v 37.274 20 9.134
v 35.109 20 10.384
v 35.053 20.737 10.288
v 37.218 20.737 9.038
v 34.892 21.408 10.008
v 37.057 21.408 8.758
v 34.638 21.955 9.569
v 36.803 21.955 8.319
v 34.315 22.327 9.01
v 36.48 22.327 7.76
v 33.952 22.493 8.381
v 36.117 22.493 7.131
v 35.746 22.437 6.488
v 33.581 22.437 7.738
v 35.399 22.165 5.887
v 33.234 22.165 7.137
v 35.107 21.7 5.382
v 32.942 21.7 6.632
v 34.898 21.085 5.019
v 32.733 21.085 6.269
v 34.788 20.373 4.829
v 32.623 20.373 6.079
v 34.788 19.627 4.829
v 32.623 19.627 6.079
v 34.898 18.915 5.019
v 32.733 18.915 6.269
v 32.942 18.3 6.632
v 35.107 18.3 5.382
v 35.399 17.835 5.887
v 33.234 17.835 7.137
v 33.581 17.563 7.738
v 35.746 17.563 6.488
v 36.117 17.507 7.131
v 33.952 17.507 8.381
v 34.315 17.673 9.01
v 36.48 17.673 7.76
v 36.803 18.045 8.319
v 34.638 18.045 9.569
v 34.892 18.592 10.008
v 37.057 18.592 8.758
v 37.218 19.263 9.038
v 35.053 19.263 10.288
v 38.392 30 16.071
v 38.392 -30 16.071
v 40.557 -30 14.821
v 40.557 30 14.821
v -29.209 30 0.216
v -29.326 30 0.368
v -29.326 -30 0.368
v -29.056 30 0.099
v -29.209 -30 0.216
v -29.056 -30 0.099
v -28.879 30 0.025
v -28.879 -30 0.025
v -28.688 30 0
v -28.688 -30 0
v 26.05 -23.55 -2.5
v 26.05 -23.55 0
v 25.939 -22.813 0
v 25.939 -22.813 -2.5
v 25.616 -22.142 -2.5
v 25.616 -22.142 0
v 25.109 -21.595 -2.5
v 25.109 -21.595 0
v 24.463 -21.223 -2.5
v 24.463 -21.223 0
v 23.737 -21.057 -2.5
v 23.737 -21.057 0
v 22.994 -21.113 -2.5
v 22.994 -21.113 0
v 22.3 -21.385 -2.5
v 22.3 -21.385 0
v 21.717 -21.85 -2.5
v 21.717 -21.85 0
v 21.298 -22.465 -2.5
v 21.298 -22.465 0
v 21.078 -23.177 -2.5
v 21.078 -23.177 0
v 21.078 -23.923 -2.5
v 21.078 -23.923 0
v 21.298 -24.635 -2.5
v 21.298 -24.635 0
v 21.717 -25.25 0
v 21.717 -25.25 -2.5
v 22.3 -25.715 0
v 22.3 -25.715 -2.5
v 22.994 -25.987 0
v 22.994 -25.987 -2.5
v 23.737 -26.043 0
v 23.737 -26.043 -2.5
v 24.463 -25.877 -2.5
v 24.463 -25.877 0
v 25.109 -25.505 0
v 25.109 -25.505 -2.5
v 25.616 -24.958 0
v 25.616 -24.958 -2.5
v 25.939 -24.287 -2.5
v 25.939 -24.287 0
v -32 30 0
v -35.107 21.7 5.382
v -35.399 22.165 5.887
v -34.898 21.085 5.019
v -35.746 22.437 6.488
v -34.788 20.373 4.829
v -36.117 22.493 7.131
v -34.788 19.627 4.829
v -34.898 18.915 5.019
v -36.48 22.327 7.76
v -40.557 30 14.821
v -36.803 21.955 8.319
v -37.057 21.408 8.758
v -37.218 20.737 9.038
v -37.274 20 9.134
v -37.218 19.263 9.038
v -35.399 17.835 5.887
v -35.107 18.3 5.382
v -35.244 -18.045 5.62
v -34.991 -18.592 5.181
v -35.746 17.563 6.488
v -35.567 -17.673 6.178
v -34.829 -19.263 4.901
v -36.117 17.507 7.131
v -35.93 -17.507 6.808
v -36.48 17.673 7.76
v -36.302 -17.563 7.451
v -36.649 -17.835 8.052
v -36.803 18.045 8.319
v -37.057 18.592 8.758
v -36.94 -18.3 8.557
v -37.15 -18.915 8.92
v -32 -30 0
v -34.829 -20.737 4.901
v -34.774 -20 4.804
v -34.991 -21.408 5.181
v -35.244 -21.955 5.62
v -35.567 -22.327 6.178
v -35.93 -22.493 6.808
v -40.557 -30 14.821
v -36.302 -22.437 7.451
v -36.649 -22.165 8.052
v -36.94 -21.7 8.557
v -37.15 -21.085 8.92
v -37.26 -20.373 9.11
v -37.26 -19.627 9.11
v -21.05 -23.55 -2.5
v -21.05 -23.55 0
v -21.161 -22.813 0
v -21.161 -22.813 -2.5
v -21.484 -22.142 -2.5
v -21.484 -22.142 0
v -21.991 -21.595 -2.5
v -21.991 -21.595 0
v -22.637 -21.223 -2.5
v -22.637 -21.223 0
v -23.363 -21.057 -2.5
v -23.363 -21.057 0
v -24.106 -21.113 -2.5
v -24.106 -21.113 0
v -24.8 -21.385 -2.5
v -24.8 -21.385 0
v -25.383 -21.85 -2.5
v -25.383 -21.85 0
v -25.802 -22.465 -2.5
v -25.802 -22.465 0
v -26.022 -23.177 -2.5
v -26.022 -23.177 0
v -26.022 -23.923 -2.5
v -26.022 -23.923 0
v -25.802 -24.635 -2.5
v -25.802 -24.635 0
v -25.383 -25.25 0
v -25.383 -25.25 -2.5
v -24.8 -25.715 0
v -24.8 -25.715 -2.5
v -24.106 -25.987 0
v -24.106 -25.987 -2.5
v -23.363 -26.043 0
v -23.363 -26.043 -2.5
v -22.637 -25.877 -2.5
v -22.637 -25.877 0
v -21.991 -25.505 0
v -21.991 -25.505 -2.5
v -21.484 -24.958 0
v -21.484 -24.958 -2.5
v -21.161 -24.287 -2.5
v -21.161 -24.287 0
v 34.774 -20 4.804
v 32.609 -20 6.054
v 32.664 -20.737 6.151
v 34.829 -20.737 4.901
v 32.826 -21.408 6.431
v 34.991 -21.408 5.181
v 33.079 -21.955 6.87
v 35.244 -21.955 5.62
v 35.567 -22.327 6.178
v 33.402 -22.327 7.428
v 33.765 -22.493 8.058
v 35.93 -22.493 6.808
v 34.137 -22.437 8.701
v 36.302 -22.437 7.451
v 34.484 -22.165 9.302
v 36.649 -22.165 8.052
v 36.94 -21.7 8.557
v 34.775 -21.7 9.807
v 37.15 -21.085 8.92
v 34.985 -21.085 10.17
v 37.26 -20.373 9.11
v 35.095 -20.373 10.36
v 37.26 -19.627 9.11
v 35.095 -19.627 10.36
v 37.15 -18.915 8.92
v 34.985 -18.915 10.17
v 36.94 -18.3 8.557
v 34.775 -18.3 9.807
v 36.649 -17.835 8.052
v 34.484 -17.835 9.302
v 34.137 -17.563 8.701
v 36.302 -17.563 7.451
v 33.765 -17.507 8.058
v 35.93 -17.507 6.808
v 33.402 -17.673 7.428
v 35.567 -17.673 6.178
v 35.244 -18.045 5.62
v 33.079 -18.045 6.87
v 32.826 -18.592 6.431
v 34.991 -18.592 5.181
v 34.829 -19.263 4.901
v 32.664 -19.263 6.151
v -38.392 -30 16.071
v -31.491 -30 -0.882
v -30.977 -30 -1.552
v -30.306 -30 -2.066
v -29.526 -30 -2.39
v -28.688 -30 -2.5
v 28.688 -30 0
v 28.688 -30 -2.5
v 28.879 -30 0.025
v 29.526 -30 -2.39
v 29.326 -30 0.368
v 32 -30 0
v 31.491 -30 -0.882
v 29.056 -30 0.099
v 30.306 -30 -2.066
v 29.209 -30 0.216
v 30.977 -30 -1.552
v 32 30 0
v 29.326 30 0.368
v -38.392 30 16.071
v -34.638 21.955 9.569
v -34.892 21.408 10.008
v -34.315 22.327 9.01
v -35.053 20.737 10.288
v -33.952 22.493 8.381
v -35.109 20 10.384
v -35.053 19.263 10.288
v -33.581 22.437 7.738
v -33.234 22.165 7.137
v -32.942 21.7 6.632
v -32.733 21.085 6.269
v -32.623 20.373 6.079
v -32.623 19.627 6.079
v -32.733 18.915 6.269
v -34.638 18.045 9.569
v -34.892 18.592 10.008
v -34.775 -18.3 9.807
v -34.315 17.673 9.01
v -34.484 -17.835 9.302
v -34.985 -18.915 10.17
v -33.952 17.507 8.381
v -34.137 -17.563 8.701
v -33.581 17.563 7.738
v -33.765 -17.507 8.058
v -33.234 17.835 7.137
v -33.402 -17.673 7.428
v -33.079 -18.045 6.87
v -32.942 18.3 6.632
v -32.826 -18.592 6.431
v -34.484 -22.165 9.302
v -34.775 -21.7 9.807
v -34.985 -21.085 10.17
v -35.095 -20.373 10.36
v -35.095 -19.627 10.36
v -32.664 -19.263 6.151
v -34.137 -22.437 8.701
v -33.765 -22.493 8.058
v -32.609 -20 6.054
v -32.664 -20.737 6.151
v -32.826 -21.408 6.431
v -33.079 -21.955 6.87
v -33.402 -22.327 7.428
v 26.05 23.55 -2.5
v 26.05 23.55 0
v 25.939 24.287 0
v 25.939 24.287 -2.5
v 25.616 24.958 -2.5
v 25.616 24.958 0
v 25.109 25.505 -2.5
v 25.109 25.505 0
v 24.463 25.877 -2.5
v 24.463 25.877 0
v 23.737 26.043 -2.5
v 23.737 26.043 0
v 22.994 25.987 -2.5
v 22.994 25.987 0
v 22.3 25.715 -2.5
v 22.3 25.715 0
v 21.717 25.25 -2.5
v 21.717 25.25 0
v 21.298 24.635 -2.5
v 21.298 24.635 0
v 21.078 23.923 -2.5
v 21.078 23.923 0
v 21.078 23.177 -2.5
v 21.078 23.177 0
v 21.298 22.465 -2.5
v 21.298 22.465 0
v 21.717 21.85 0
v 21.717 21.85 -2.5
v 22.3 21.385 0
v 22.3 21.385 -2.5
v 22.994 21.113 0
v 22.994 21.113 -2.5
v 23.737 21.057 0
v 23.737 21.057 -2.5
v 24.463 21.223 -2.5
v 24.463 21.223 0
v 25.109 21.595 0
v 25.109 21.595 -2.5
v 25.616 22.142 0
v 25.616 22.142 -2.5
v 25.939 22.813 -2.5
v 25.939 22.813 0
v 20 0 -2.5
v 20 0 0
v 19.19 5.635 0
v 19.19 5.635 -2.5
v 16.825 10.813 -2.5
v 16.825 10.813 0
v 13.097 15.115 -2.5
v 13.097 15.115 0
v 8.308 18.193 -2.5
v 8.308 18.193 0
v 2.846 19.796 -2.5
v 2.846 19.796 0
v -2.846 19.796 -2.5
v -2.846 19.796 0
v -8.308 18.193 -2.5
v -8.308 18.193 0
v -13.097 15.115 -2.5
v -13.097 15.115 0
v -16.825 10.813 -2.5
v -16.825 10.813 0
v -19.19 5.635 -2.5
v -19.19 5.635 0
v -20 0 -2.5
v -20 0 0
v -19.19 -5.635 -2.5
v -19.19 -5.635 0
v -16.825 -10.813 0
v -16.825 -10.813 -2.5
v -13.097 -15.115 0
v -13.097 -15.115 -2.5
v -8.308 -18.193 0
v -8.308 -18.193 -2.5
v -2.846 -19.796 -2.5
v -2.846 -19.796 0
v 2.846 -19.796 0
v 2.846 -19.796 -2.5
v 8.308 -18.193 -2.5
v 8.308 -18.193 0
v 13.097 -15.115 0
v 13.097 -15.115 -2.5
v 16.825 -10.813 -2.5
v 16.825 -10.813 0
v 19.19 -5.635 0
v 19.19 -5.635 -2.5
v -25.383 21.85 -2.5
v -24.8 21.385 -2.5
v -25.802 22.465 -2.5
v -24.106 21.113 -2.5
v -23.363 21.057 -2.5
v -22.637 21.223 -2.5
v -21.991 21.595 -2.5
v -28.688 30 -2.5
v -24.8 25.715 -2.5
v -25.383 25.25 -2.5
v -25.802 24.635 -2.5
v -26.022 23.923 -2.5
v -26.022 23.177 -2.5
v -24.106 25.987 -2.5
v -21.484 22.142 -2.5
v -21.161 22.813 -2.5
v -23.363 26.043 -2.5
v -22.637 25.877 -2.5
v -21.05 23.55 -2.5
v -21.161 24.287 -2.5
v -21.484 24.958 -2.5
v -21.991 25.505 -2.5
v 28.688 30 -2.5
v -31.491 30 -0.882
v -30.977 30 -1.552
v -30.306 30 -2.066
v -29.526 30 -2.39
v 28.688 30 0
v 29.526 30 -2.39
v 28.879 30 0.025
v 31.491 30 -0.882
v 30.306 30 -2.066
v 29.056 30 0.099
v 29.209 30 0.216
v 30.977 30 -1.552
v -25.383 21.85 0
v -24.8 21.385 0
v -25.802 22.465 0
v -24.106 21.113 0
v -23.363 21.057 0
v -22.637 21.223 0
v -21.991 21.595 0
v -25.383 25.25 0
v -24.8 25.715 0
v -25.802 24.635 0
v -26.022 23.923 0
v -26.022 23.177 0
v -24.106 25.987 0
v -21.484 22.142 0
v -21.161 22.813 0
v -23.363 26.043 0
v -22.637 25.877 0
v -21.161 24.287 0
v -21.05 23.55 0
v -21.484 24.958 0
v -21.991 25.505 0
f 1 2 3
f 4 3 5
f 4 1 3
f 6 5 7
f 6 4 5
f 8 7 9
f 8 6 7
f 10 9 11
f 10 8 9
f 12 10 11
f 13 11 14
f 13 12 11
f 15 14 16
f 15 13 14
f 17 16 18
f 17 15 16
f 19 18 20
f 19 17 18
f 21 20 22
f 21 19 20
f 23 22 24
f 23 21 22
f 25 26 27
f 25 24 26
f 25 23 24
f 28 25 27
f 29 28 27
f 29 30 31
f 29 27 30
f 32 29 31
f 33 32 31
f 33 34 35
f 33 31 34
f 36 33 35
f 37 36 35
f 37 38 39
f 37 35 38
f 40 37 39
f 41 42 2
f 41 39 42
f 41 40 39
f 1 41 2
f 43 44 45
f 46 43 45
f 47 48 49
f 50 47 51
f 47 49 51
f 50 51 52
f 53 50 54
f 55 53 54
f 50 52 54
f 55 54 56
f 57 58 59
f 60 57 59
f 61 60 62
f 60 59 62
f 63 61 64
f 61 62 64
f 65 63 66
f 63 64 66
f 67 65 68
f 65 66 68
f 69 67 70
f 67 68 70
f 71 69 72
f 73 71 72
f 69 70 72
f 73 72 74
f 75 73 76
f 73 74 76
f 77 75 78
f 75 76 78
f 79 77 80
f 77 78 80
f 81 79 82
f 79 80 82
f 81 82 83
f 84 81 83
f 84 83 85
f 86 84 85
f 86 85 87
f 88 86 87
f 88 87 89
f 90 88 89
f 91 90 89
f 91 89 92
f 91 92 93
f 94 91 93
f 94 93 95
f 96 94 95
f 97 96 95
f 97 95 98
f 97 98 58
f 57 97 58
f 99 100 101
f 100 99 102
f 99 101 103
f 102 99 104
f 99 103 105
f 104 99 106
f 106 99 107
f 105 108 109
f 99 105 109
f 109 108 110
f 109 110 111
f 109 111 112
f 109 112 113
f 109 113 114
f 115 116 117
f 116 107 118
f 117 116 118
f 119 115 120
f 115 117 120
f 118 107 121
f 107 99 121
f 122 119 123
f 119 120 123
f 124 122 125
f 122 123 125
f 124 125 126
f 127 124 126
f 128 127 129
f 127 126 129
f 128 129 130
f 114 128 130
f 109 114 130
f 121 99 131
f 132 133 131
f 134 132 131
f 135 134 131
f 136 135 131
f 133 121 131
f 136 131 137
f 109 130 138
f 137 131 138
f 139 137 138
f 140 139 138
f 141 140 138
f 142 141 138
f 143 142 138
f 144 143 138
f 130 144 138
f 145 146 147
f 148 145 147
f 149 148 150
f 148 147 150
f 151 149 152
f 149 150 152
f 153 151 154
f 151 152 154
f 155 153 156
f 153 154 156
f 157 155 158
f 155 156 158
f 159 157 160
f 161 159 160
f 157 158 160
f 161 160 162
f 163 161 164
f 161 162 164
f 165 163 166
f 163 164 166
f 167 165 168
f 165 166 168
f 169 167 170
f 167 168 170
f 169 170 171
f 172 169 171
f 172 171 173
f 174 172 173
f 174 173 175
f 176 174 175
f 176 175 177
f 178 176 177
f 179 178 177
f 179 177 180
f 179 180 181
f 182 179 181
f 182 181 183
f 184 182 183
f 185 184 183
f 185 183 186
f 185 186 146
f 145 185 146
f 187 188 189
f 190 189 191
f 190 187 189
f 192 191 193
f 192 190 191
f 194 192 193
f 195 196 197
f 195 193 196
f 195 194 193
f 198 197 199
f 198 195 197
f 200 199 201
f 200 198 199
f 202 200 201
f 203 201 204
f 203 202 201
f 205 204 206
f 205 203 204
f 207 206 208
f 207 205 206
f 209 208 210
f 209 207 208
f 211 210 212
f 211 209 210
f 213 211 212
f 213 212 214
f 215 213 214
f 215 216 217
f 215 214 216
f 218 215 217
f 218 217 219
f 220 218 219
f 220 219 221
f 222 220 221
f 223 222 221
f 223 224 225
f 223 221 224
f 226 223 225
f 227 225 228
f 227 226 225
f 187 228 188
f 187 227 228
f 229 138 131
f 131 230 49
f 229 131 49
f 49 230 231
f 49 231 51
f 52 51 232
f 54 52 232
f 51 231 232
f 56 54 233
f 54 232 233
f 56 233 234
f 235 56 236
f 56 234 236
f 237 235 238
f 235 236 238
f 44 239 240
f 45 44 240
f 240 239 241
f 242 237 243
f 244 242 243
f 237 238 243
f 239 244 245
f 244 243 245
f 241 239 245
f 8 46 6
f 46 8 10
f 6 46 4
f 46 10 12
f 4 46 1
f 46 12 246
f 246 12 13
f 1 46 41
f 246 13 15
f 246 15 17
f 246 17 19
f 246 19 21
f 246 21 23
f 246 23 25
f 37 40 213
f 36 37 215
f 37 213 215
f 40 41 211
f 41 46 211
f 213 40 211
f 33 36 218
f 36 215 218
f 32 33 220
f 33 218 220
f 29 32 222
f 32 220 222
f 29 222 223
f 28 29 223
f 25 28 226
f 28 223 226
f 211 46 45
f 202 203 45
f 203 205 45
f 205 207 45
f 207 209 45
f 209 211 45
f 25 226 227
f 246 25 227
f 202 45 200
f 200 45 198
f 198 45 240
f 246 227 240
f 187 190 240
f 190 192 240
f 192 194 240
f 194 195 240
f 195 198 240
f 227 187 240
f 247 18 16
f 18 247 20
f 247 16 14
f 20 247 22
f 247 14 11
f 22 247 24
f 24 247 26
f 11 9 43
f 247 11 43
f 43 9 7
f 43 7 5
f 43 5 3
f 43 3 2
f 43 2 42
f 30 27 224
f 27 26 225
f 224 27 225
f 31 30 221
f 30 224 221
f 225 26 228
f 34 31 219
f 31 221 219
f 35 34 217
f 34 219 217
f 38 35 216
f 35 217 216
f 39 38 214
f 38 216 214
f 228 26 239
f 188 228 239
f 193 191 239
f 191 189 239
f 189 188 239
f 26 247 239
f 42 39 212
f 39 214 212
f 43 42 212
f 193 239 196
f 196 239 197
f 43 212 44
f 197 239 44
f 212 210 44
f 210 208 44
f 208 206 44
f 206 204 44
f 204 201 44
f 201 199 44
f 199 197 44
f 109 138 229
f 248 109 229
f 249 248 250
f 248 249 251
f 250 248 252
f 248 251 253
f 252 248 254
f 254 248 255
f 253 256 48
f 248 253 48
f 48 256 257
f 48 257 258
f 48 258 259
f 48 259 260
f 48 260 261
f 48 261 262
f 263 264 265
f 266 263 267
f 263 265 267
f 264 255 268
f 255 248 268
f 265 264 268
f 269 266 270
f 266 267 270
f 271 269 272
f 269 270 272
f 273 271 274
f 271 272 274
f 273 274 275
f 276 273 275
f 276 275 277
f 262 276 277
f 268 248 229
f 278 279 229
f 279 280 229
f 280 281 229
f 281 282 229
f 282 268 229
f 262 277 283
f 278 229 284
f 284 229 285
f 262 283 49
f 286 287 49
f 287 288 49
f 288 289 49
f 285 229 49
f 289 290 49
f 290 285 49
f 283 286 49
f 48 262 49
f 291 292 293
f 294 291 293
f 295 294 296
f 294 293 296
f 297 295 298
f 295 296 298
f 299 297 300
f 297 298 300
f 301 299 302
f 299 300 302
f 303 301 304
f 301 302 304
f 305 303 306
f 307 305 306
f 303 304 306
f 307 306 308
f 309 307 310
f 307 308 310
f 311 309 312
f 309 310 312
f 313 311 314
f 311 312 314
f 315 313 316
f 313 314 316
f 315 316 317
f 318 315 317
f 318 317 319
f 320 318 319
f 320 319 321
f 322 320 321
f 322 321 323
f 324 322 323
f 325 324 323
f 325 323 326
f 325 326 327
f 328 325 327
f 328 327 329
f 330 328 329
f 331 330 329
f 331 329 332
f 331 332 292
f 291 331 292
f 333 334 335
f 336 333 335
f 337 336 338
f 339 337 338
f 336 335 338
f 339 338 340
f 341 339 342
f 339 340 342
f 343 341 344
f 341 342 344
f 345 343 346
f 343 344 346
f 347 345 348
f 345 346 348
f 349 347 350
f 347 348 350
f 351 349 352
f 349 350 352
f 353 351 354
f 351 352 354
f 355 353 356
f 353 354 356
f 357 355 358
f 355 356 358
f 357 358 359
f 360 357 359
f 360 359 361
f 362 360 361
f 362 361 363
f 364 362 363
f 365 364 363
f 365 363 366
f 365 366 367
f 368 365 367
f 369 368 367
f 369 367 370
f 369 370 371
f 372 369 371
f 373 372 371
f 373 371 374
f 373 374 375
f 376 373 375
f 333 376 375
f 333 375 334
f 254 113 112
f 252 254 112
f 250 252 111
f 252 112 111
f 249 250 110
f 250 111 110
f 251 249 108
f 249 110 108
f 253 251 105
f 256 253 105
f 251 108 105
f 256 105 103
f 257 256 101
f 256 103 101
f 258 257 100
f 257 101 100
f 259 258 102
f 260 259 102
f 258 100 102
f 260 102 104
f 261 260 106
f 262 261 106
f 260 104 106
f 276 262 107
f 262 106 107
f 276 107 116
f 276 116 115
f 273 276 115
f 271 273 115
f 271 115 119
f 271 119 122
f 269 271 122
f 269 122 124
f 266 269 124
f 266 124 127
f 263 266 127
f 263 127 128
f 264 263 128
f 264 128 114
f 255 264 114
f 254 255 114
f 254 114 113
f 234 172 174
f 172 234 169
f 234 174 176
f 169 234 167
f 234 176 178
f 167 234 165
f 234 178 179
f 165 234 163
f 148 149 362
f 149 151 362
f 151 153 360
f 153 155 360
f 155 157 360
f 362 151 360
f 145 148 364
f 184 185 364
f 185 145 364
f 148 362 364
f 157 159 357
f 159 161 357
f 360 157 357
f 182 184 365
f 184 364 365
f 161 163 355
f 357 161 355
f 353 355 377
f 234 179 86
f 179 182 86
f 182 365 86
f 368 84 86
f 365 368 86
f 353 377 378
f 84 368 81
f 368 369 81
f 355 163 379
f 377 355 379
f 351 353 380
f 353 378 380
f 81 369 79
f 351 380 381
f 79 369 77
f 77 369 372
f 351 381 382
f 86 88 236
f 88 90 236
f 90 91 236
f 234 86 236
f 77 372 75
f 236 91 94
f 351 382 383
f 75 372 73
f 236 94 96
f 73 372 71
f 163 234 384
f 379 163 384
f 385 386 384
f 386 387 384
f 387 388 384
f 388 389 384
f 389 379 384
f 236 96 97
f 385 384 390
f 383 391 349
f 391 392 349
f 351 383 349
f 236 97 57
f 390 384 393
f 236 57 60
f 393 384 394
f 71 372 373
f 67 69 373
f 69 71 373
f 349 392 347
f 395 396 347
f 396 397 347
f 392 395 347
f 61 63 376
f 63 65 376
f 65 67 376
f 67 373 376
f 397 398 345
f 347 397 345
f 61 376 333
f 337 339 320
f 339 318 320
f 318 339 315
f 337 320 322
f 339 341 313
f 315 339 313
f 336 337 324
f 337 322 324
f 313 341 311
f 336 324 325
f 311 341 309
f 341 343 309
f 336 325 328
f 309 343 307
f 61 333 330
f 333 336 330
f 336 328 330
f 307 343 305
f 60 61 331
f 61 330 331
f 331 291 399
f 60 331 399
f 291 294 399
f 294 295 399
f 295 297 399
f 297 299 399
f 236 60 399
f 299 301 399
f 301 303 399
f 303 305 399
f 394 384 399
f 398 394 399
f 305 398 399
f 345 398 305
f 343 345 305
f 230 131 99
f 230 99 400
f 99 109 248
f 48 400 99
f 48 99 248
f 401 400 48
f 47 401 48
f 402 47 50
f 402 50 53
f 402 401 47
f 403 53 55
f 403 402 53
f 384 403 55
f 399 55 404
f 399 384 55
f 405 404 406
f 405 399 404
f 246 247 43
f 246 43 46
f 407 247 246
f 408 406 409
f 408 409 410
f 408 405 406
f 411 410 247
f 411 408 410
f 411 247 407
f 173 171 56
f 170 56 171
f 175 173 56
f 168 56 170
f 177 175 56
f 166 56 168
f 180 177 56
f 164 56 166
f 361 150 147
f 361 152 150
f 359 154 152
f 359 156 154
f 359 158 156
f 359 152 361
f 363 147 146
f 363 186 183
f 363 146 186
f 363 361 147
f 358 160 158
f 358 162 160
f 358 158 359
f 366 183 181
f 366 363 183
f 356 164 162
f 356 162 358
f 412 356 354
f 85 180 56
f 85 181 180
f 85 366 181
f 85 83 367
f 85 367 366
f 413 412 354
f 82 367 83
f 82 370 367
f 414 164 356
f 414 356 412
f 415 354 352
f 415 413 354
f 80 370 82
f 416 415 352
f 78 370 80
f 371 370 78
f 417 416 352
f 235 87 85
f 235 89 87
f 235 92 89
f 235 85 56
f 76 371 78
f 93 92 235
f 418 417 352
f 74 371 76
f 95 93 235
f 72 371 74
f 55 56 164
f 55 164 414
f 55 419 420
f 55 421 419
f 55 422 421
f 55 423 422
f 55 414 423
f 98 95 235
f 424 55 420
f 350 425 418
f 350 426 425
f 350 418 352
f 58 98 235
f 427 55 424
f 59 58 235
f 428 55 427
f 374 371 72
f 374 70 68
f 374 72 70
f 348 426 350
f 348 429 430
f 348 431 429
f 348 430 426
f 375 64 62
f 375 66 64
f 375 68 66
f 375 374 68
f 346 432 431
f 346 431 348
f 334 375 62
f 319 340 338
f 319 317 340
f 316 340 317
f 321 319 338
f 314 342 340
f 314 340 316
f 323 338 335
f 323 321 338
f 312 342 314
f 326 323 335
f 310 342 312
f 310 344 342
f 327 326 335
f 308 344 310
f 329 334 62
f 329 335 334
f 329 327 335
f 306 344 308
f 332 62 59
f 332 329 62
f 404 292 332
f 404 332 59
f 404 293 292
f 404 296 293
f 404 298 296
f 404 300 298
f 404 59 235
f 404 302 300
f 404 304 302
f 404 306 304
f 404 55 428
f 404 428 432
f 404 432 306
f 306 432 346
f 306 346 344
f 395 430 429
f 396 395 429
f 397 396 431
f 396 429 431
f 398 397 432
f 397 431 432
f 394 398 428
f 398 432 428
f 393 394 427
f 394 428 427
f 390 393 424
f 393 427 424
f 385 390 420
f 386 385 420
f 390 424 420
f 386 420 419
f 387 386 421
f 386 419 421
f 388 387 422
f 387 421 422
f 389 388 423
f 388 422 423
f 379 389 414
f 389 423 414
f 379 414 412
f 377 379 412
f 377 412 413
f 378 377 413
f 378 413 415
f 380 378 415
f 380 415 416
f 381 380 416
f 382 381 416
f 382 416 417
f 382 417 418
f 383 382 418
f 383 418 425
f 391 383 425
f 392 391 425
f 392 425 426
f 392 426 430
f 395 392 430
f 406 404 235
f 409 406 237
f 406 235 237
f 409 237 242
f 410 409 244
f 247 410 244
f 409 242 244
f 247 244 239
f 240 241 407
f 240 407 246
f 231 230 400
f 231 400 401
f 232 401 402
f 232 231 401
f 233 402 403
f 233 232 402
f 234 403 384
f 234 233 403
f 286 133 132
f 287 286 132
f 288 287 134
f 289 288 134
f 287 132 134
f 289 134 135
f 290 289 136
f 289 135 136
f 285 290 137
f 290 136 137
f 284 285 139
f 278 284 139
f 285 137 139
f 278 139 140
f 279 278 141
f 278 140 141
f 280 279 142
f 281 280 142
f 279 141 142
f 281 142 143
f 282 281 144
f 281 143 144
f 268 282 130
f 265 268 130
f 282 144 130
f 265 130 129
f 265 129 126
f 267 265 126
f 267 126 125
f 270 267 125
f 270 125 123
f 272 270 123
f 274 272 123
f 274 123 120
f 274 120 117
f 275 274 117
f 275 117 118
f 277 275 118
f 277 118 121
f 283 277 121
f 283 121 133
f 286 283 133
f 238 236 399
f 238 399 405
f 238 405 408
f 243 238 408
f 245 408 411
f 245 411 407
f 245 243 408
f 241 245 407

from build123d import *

# Parameters (mm, degrees)
SCHIZZO1_W               = 64
SCHIZZO1_H               = 60
BASE_FLANGIA1_DEPTH      = 2.5
BORDO_FLANGIA1_START     = -30
BORDO_FLANGIA1_DEPTH     = 60
BORDO_FLANGIA1_2_DEPTH   = 60
BORDO_FLANGIA2_START     = -30
BORDO_FLANGIA2_DEPTH     = 60
BORDO_FLANGIA2_2_DEPTH   = 60
SCHIZZO12_R              = 2.5
SCHIZZO12_R_2            = 20
TAGLIO_ESTRUSIONE1_DEPTH = 10
SCHIZZO14_R              = 2.5
TAGLIO_ESTRUSIONE2_DEPTH = 10


# Read off the part's stored shape, not the designer's step: Bordo-Flangia1, Bordo-Flangia2
# Sheet-metal steps are written as plain solids
with BuildPart() as part:
    # Schizzo1 → Base-Flangia1 (new body)
    with BuildSketch(Plane.XY):
        Rectangle(SCHIZZO1_W, SCHIZZO1_H)
    extrude(amount=-BASE_FLANGIA1_DEPTH)

    # Bordo-Flangia1 outline → Bordo-Flangia1 (cut)
    with BuildSketch(Plane(origin=(0, 0, 0), x_dir=(1, 0, 0), z_dir=(0, 1, 0)).offset(BORDO_FLANGIA1_START)):
        with BuildLine():
            ThreePointArc((28.687972446, 2.5), (30.306272446, 2.066377822), (31.490950268, 0.8817))
            Line((31.490950268, 0.8817), (32, 0))
            Line((32, 0), (32, 2.5))
            Line((32, 2.5), (28.687972446, 2.5))
        make_face()
    extrude(amount=BORDO_FLANGIA1_DEPTH, mode=Mode.SUBTRACT)

    # Bordo-Flangia1 2 outline → Bordo-Flangia1 2 (add)
    with BuildSketch(Plane(origin=(0, 0, 0), x_dir=(1, 0, 0), z_dir=(0, 1, 0)).offset(BORDO_FLANGIA1_START)):
        with BuildLine():
            Line((40.556624327, -14.820508076), (32, 0))
            Line((32, 0), (28.687972446, 0))
            ThreePointArc((28.687972446, 0), (29.056272446, -0.098685688), (29.325886758, -0.3683))
            Line((29.325886758, -0.3683), (38.391560818, -16.070508076))
            Line((38.391560818, -16.070508076), (40.556624327, -14.820508076))
        make_face()
    extrude(amount=BORDO_FLANGIA1_2_DEPTH)

    # Bordo-Flangia2 outline → Bordo-Flangia2 (cut)
    with BuildSketch(Plane(origin=(0, 0, 0), x_dir=(1, 0, 0), z_dir=(0, 1, 0)).offset(BORDO_FLANGIA2_START)):
        with BuildLine():
            Line((-32, 0), (-31.490950268, 0.8817))
            ThreePointArc((-31.490950268, 0.8817), (-30.306272446, 2.066377822), (-28.687972446, 2.5))
            Line((-28.687972446, 2.5), (-32, 2.5))
            Line((-32, 2.5), (-32, 0))
        make_face()
    extrude(amount=BORDO_FLANGIA2_DEPTH, mode=Mode.SUBTRACT)

    # Bordo-Flangia2 2 outline → Bordo-Flangia2 2 (add)
    with BuildSketch(Plane(origin=(0, 0, 0), x_dir=(1, 0, 0), z_dir=(0, 1, 0)).offset(BORDO_FLANGIA2_START)):
        with BuildLine():
            Line((-28.687972446, 0), (-32, 0))
            Line((-32, 0), (-40.556624327, -14.820508076))
            Line((-40.556624327, -14.820508076), (-38.391560818, -16.070508076))
            Line((-38.391560818, -16.070508076), (-29.325886758, -0.3683))
            ThreePointArc((-29.325886758, -0.3683), (-29.056272446, -0.098685688), (-28.687972446, 0))
        make_face()
    extrude(amount=BORDO_FLANGIA2_2_DEPTH)

    # Schizzo12 → Taglio-Estrusione1 (cut)
    with BuildSketch(Plane.XY):
        with Locations((-23.55, 23.55)):
            Circle(SCHIZZO12_R)
        with Locations((23.55, 23.55)):
            Circle(SCHIZZO12_R)
        with Locations((23.55, -23.55)):
            Circle(SCHIZZO12_R)
        with Locations((-23.55, -23.55)):
            Circle(SCHIZZO12_R)
        Circle(SCHIZZO12_R_2)
    extrude(amount=-TAGLIO_ESTRUSIONE1_DEPTH, mode=Mode.SUBTRACT)

    # Schizzo14 → Taglio-Estrusione2 (cut)
    with BuildSketch(Plane(origin=(-24, 0, -13.856406461), x_dir=(-0.5000000000000043, 0, 0.8660254037844363), z_dir=(-0.8660254037844362, 0, -0.5000000000000042))):
        with Locations((24.047574595, 20)):
            Circle(SCHIZZO14_R)
        with Locations(Location((24.047574595, -20, 0), (0, 0, 180))):
            Circle(SCHIZZO14_R)
    taglio_estrusione2 = extrude(amount=-TAGLIO_ESTRUSIONE2_DEPTH, mode=Mode.SUBTRACT)

    # Specchia1: Taglio-Estrusione2 across plane
    add(taglio_estrusione2.mirror(Plane(origin=(0, 0, 0), x_dir=(0, 0, 1), z_dir=(1, 0, 0))), mode=Mode.SUBTRACT)


solid = part.part
